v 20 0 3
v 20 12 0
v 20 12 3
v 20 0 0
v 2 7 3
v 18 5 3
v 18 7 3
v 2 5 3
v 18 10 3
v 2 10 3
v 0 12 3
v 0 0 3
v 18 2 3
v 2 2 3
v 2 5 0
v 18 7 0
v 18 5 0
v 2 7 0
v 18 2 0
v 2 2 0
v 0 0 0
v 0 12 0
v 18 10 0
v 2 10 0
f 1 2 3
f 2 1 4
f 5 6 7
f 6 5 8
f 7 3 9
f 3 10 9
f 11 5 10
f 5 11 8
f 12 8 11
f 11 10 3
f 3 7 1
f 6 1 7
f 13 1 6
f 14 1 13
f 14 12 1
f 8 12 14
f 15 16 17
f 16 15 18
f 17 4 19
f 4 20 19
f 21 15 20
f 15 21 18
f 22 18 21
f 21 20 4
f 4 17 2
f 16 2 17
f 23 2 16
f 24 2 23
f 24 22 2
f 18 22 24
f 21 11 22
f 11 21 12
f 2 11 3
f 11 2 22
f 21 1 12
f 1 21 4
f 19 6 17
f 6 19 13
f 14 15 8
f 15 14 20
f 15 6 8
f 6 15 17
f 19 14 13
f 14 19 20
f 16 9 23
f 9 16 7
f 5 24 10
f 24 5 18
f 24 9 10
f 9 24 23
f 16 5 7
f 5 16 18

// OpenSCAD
width = 20;
height = 12;
length = 3;

difference() {
    cube([width, height, length]);

    translate([2, 2, 0]) {
        cube([(width - 4), (height / 4), length]);
    }

    translate([2, 7, 0]) {
        cube([(width - 4), (height / 4), length]);
    }
}
